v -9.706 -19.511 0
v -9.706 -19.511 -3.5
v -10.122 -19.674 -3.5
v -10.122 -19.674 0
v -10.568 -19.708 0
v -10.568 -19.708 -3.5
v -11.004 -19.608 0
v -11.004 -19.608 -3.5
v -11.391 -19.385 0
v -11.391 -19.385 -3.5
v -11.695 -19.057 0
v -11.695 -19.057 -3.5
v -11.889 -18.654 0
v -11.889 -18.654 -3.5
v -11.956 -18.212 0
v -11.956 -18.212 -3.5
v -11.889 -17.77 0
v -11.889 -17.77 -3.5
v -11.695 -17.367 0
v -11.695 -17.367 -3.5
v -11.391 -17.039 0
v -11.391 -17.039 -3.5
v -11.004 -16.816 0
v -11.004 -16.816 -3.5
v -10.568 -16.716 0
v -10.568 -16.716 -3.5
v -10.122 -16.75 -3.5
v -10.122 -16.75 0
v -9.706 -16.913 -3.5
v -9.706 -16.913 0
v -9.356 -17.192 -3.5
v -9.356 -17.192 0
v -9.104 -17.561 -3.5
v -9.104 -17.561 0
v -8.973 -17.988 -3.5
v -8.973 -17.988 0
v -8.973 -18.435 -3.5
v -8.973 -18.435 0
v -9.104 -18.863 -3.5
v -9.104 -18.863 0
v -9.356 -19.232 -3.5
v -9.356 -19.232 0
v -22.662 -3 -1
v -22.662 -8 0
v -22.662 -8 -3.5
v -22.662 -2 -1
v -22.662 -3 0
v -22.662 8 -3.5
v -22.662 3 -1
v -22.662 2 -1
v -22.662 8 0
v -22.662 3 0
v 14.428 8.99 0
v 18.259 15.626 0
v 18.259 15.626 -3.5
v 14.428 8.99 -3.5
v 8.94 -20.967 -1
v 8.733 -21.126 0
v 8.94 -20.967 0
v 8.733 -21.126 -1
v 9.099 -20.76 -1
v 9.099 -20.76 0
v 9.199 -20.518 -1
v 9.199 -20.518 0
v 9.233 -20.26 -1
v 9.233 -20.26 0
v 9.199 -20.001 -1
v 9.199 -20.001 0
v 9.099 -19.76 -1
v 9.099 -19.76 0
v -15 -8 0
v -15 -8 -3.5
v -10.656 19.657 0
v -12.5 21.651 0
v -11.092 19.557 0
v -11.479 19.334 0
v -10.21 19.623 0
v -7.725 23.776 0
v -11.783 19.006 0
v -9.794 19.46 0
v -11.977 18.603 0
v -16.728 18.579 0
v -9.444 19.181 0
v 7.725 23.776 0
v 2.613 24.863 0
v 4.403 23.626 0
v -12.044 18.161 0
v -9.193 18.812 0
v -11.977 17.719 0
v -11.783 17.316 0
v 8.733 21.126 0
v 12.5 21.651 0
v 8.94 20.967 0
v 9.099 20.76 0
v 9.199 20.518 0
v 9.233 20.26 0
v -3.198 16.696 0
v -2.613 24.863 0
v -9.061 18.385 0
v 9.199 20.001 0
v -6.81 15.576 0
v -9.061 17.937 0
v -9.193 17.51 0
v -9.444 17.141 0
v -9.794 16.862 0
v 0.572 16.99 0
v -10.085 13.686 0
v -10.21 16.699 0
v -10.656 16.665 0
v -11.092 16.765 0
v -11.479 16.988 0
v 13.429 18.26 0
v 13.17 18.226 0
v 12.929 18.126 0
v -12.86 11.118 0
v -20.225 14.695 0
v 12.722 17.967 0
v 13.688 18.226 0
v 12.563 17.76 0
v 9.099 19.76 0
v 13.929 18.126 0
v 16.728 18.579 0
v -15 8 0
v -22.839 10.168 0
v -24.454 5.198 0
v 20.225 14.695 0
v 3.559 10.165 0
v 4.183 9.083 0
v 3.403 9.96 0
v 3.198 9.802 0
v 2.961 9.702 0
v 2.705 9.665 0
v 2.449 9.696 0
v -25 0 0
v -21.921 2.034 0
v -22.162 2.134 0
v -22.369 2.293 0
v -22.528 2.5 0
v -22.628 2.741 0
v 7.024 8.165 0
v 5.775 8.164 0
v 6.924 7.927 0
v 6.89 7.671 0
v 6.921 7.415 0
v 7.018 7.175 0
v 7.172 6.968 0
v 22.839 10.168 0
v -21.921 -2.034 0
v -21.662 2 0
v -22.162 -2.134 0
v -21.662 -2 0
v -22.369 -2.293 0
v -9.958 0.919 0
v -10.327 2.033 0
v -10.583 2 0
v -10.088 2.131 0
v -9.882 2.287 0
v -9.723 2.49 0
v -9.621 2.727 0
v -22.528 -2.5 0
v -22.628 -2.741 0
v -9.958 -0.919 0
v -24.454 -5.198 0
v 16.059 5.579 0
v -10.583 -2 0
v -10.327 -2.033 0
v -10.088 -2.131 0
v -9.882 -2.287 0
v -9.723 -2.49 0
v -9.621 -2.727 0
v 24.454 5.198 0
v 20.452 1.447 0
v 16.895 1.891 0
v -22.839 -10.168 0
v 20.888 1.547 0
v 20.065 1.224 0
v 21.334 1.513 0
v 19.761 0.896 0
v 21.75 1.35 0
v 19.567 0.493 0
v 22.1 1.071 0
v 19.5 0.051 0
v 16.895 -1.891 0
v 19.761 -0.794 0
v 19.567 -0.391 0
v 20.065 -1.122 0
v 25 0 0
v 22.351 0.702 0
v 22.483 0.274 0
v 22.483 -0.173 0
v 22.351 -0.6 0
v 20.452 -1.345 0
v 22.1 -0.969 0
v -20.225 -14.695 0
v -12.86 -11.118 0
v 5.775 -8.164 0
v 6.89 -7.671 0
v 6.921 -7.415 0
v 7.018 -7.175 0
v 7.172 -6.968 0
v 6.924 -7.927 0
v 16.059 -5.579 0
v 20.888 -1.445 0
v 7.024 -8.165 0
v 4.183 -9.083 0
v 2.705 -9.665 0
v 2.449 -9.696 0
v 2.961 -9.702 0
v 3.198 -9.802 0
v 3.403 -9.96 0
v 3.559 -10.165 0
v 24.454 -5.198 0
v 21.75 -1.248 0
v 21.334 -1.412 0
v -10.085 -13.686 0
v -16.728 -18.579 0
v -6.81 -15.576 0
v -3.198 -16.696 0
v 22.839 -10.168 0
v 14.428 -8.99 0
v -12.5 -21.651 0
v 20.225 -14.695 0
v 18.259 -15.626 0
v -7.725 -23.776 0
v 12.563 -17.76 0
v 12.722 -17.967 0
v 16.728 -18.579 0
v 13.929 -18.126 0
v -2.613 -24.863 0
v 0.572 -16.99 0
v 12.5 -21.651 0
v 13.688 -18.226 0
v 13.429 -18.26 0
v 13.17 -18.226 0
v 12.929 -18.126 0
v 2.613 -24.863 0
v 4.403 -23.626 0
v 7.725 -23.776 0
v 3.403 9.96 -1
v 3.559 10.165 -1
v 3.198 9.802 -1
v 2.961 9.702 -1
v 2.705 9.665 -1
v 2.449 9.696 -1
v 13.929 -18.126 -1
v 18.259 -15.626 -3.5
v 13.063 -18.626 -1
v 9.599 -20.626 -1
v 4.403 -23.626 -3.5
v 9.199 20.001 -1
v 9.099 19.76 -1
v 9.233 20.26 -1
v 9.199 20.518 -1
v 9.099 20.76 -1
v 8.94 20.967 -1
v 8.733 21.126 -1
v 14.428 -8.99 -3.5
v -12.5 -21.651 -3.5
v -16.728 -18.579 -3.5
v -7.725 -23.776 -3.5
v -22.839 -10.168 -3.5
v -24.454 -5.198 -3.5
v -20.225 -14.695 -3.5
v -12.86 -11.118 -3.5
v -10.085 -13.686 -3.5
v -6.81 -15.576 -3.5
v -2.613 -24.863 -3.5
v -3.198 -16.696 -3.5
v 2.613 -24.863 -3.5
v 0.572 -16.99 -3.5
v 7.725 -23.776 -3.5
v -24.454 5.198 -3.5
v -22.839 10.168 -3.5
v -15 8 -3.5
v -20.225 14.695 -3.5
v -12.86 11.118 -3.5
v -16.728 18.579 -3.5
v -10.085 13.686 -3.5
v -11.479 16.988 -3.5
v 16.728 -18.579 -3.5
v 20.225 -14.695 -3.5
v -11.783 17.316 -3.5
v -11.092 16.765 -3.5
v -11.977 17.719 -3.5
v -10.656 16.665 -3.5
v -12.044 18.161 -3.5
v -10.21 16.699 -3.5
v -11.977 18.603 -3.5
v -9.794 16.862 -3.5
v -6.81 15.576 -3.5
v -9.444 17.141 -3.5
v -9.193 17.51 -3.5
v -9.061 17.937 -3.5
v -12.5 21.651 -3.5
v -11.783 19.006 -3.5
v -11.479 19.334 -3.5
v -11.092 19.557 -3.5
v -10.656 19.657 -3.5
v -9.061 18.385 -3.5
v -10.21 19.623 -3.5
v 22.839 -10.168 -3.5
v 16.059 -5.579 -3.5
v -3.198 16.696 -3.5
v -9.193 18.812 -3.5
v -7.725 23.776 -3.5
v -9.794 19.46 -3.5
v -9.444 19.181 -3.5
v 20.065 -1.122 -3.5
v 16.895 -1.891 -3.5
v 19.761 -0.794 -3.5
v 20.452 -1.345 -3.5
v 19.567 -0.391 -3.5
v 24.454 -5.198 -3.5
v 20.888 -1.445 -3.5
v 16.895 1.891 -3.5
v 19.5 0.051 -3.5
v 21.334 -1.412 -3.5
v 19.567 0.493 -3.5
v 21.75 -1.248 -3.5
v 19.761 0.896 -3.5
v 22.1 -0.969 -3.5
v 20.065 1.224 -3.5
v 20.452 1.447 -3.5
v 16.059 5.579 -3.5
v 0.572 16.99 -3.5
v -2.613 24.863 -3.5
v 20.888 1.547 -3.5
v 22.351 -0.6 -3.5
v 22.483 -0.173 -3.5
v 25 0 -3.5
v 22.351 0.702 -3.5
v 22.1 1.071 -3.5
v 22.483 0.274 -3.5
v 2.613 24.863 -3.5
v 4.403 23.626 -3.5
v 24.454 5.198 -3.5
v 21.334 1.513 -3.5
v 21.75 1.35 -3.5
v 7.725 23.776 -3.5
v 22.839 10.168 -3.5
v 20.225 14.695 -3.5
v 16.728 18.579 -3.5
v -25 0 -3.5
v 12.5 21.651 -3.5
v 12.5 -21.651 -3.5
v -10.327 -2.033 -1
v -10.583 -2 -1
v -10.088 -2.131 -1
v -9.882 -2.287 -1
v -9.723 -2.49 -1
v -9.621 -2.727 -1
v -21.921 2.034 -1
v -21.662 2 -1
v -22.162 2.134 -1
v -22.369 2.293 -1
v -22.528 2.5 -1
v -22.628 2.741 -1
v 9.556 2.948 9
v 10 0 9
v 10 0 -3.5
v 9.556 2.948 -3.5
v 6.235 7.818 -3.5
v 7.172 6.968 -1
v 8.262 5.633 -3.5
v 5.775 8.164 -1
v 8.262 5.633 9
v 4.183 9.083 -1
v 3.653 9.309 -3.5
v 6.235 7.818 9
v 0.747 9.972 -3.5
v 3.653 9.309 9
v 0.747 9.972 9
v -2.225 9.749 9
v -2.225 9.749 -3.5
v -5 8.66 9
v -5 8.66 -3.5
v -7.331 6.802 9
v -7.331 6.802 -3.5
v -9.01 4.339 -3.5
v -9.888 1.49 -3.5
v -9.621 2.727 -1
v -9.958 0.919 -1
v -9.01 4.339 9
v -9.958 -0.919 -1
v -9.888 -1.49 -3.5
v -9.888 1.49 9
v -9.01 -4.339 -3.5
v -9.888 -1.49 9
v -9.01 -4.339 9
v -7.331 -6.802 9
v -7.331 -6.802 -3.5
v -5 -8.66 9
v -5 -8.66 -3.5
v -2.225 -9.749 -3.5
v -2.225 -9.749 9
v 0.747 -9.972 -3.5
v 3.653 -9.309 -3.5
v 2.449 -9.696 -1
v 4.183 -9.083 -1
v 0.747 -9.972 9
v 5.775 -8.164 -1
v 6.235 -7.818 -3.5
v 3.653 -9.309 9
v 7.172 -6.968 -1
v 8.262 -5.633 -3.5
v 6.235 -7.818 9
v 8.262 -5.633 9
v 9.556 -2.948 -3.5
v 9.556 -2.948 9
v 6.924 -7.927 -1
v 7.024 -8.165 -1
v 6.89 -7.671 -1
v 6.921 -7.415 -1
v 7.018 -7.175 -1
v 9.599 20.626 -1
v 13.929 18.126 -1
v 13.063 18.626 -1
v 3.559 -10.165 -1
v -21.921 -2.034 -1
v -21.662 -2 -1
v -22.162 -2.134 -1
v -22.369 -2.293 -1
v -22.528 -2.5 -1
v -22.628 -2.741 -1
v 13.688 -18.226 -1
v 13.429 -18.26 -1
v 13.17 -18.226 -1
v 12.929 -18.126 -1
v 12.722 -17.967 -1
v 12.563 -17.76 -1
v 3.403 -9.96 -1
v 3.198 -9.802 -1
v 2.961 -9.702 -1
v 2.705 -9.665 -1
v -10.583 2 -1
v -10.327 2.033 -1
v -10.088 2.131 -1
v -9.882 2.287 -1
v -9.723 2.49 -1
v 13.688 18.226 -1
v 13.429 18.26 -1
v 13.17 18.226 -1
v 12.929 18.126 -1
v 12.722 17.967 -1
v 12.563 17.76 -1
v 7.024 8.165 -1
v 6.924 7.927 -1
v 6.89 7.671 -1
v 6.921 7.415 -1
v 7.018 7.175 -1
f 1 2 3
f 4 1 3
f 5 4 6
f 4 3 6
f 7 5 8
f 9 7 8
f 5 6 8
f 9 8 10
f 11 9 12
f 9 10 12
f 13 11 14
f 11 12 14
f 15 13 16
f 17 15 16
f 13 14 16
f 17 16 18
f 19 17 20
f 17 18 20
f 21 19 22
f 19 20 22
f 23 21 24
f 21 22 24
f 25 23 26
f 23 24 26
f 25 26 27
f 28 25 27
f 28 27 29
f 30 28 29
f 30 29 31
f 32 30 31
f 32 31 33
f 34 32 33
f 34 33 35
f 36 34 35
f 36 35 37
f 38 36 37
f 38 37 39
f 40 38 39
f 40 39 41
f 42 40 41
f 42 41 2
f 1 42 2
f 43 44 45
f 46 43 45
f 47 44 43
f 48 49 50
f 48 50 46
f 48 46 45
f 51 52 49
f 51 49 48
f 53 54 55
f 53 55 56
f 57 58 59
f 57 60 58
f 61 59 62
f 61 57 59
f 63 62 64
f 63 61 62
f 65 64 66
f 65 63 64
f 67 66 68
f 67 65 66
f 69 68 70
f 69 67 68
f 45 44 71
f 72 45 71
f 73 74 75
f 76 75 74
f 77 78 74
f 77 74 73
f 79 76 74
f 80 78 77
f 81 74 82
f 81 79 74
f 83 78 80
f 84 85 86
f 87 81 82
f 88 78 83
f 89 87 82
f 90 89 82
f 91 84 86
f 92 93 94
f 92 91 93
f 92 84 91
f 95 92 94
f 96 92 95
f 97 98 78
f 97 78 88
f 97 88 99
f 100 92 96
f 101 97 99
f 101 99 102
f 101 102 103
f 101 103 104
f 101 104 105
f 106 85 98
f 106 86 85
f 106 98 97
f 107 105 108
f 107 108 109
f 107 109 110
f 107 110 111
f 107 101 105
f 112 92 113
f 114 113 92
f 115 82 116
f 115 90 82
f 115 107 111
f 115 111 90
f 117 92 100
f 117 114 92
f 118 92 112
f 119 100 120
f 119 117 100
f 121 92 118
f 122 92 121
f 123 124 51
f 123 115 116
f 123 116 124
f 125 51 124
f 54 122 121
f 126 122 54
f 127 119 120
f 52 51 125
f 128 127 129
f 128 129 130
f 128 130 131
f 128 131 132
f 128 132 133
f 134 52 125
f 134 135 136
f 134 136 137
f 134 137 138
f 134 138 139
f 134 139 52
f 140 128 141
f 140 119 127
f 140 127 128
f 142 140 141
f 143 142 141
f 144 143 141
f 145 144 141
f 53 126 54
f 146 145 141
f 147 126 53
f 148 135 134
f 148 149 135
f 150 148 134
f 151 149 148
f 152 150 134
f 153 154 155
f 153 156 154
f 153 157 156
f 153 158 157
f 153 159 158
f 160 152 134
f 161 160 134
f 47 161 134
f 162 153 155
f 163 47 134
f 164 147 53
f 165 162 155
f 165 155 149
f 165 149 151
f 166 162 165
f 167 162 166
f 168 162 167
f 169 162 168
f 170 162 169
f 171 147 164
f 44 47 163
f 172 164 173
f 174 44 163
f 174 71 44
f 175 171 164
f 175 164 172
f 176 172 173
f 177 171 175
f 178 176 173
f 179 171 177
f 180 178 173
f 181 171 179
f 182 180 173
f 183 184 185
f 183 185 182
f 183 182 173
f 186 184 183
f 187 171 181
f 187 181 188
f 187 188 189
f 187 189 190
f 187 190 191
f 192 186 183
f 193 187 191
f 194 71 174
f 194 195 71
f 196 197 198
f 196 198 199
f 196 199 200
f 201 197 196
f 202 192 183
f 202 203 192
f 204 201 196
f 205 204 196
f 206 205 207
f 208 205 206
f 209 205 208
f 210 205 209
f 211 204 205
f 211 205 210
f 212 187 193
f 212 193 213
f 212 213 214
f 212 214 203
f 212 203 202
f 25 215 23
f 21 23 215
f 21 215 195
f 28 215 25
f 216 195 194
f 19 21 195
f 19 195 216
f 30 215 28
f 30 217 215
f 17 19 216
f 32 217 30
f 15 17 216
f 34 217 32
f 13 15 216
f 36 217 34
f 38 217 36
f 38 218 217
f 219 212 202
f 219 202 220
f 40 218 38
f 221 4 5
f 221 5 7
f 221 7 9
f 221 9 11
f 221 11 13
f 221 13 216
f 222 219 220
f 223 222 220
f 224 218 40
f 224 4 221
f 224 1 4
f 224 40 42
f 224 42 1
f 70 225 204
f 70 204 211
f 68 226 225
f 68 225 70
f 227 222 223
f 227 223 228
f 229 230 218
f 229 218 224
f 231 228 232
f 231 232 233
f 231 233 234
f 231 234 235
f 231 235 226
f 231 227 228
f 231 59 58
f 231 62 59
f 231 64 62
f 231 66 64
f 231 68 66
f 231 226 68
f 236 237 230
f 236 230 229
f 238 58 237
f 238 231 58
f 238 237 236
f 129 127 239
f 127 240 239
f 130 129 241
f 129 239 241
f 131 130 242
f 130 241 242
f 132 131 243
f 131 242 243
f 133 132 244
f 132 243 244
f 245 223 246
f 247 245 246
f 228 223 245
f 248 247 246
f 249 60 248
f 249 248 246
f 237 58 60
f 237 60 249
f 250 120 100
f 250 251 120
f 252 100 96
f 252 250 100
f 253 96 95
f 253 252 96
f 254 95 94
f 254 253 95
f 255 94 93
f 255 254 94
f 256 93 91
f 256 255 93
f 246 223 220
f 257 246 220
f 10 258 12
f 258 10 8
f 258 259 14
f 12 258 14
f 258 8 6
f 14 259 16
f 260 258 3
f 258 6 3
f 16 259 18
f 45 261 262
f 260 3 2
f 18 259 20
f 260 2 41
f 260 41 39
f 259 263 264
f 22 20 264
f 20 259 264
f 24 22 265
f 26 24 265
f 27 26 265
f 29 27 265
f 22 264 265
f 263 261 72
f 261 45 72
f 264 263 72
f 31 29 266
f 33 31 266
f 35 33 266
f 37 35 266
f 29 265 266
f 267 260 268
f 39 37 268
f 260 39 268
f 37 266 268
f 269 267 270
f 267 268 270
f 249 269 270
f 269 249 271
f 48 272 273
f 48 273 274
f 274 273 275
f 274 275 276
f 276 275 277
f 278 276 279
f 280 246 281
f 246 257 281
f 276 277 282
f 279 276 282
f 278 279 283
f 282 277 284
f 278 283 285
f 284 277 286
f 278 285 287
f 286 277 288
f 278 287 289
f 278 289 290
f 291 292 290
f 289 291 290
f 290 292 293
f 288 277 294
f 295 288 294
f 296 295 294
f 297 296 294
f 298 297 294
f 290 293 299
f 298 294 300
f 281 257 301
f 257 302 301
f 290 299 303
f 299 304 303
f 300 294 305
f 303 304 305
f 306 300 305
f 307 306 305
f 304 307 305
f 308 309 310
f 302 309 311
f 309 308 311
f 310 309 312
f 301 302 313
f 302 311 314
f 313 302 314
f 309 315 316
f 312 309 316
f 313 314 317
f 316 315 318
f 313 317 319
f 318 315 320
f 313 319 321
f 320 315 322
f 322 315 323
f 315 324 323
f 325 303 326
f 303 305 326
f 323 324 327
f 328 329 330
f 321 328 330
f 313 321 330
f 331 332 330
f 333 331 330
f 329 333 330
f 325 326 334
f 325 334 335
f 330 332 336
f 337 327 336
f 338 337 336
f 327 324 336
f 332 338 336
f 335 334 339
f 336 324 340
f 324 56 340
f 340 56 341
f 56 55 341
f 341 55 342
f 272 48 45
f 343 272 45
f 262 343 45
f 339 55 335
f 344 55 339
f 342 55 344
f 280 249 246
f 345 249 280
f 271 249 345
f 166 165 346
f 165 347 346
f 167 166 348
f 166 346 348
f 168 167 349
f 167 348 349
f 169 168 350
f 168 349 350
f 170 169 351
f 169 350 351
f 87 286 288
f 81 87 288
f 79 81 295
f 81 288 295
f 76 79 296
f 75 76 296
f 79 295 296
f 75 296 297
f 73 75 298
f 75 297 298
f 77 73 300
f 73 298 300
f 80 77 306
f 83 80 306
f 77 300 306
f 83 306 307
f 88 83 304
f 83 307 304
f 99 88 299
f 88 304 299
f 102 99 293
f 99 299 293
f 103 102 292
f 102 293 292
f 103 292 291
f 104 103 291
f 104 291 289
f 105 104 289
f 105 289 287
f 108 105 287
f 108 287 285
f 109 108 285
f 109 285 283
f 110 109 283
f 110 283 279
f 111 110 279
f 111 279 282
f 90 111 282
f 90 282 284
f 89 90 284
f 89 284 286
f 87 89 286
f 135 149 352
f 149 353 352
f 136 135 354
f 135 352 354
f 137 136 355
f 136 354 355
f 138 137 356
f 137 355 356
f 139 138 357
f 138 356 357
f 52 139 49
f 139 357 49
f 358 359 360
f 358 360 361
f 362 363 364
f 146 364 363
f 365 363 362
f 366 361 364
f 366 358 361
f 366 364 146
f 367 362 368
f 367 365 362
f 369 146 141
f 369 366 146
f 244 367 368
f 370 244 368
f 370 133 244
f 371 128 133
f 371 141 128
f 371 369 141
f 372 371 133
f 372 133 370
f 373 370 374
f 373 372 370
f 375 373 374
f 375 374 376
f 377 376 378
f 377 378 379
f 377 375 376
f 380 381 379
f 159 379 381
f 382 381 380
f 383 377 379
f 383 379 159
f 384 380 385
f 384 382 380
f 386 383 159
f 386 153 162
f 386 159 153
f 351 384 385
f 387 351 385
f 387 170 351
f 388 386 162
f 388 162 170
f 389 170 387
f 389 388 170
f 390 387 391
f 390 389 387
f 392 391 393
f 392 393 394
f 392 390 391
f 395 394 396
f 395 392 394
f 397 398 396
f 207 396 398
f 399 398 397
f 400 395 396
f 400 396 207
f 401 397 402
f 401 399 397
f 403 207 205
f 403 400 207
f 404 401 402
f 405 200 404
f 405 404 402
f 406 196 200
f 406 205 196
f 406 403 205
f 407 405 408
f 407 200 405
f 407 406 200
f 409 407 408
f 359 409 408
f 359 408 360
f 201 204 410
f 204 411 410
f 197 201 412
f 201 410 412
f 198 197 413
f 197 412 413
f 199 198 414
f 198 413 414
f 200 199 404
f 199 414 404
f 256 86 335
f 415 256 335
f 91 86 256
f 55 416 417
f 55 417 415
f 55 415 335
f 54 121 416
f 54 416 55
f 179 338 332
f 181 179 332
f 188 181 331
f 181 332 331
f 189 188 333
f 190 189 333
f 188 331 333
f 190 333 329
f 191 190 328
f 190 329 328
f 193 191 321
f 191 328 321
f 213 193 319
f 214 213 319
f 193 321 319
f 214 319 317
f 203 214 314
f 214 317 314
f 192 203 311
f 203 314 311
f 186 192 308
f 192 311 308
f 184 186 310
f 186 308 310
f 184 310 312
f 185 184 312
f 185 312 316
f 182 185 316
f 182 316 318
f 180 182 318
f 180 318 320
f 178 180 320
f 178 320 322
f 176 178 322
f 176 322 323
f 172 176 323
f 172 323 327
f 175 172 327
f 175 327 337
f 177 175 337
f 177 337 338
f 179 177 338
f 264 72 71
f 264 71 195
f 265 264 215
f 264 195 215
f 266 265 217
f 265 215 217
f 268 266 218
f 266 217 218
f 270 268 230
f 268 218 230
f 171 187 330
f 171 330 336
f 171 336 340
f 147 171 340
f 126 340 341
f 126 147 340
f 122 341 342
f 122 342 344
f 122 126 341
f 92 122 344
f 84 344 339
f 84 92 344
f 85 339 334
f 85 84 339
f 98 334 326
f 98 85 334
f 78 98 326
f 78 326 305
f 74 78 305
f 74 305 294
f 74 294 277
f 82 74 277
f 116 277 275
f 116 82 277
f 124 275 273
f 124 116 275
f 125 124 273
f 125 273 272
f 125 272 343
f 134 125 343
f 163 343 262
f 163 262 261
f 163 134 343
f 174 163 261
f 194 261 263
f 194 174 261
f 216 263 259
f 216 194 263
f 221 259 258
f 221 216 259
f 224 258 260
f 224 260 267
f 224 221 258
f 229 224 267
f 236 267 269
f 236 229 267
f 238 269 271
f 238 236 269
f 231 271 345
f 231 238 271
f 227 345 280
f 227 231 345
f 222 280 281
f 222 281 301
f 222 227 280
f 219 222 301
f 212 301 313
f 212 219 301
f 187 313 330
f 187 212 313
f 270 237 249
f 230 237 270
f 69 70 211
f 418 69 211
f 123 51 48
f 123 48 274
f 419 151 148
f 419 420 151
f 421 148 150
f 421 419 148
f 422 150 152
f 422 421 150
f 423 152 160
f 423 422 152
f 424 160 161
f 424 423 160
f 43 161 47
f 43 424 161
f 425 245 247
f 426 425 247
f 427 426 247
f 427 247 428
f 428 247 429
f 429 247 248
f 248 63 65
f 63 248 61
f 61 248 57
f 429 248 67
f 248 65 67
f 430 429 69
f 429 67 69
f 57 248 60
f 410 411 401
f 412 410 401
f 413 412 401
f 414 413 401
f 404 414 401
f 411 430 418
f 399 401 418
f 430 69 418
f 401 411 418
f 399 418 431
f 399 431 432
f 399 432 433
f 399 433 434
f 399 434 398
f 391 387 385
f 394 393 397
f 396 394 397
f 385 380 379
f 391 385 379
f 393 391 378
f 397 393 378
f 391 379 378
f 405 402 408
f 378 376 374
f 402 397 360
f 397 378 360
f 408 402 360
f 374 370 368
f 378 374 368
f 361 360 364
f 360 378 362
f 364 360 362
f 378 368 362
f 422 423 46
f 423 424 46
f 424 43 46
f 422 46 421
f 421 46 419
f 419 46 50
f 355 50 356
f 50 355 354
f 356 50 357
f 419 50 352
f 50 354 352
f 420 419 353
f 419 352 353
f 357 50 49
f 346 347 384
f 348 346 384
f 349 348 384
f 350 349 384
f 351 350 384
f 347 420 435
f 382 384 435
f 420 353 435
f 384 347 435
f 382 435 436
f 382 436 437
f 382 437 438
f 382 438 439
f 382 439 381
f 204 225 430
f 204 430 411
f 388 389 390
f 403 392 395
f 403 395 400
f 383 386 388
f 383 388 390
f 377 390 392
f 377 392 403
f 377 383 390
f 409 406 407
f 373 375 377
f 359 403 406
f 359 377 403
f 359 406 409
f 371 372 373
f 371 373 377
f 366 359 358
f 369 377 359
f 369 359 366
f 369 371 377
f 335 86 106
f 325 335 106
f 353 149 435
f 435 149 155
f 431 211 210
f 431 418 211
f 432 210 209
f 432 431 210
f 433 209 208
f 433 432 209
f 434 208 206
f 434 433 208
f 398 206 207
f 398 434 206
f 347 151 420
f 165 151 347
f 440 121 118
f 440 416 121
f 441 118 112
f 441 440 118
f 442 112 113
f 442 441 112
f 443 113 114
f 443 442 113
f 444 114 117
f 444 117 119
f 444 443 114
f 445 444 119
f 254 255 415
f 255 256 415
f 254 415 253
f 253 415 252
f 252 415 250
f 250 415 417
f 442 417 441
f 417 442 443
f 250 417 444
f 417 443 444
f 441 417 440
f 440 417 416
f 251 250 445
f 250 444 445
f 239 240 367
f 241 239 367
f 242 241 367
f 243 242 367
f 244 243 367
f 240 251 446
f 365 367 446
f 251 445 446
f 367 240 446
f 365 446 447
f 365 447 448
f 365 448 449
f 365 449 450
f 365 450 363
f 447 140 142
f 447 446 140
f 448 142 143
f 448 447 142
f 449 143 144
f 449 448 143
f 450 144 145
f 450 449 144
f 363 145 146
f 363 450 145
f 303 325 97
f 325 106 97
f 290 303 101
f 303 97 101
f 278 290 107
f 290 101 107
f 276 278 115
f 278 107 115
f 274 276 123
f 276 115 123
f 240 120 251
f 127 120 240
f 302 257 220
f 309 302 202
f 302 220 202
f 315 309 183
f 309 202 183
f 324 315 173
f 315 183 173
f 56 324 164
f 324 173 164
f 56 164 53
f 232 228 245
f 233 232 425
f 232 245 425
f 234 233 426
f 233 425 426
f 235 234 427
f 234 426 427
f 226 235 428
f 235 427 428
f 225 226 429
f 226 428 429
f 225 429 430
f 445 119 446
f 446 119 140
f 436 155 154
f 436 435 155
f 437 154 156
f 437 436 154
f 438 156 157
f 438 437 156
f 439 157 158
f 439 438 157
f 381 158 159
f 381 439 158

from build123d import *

# Parameters (mm, degrees)
SKETCH1_R                = 10
BOSS_EXTRUDE1_DEPTH      = 9
BOSS_EXTRUDE1_DEPTH_BACK = 3.5
SKETCH1_3_R              = 25
SKETCH1_3_R_2            = 10
BOSS_EXTRUDE2_DEPTH      = 3.5
SKETCH3_R                = 17
CUT_EXTRUDE1_DEPTH       = 3.5
SKETCH8_W                = 9
SKETCH8_H                = 16
CUT_EXTRUDE3_DEPTH       = 4.5
SKETCH10_W               = 12.863801869
SKETCH10_H               = 4
BOSS_EXTRUDE4_DEPTH      = 1
CIRPATTERN2_COUNT        = 3
F_3_0MM_DOWEL_HOLE1_D    = 3
CIRPATTERN3_COUNT        = 3
FILLET1_R                = 1
FILLET2_R                = 1
FILLET3_R                = 1
FILLET4_R                = 1
FILLET5_R                = 1
FILLET6_R                = 1
FILLET7_R                = 1
FILLET8_R                = 1
FILLET9_R                = 1
FILLET10_R               = 1
FILLET11_R               = 1
FILLET12_R               = 1


with BuildPart() as part:
    # Sketch1 → Boss-Extrude1 (new body, two sides)
    with BuildSketch(Plane.XY) as boss_extrude1_sk:
        Circle(SKETCH1_R)
    extrude(amount=BOSS_EXTRUDE1_DEPTH)
    extrude(boss_extrude1_sk.sketch, amount=-BOSS_EXTRUDE1_DEPTH_BACK)



with BuildPart() as body_2:
    # Sketch1<3> → Boss-Extrude2 (new body)
    with BuildSketch(Plane.XY):
        Circle(SKETCH1_3_R)
        Circle(SKETCH1_3_R_2, mode=Mode.SUBTRACT)
    extrude(amount=-BOSS_EXTRUDE2_DEPTH)

    # Sketch3 → Cut-Extrude1 (cut)
    with BuildSketch(Plane.XY):
        Circle(SKETCH3_R)
    extrude(amount=-CUT_EXTRUDE1_DEPTH, mode=Mode.SUBTRACT)

    # Sketch8 → Cut-Extrude3 (cut, through all)
    with BuildSketch(Plane.XY):
        with Locations((-18.16176084, 0)):
            Rectangle(SKETCH8_W, SKETCH8_H)
    cut_extrude3 = extrude(amount=-CUT_EXTRUDE3_DEPTH, mode=Mode.SUBTRACT)


with BuildPart() as part_1:
    add(part.part)

    add(body_2.part)  # Boss-Extrude4 merges body 2
    # Sketch10 → Boss-Extrude4 (add)
    with BuildSketch(Plane.XY):
        with Locations((-16.229859905, 0)):
            Rectangle(SKETCH10_W, SKETCH10_H)
    boss_extrude4 = extrude(amount=-BOSS_EXTRUDE4_DEPTH)

    # CirPattern2: Cut-Extrude3, Boss-Extrude4 ×3 about axis
    cirpattern2_axis = Axis((0, 0, 0), (0, 0, 1))
    for i in range(1, CIRPATTERN2_COUNT):
        add(cut_extrude3.rotate(cirpattern2_axis, i * 360 / CIRPATTERN2_COUNT), mode=Mode.SUBTRACT)
        add(boss_extrude4.rotate(cirpattern2_axis, i * 360 / CIRPATTERN2_COUNT))

    # Ø3.0mm Dowel Hole1 (through all)
    with Locations(Plane.XY):
        with Locations((-10.544029887, 18.161041648)):
            f_3_0mm_dowel_hole1 = Hole(F_3_0MM_DOWEL_HOLE1_D / 2)

    # CirPattern3: Ø3.0mm Dowel Hole1 ×3 about axis
    cirpattern3_axis = Axis((0, 0, 0), (0, 0, 1))
    for i in range(1, CIRPATTERN3_COUNT):
        add(f_3_0mm_dowel_hole1.rotate(cirpattern3_axis, i * 360 / CIRPATTERN3_COUNT), mode=Mode.SUBTRACT)

    # Fillet1
    fillet1_edges = [part_1.edges().sort_by_distance(p)[0] for p in [
        (9.598829613, 20.625660582, -0.5),
    ]]
    fillet(fillet1_edges, radius=FILLET1_R)

    # Fillet2
    fillet2_edges = [part_1.edges().sort_by_distance(p)[0] for p in [
        (13.062931228, 18.625660582, -0.5),
    ]]
    fillet(fillet2_edges, radius=FILLET2_R)

    # Fillet3
    fillet3_edges = [part_1.edges().sort_by_distance(p)[0] for p in [
        (6.631030293, 7.485281374, -0.5),
    ]]
    fillet(fillet3_edges, radius=FILLET3_R)

    # Fillet4
    fillet4_edges = [part_1.edges().sort_by_distance(p)[0] for p in [
        (3.166928678, 9.485281374, -0.5),
    ]]
    fillet(fillet4_edges, radius=FILLET4_R)

    # Fillet5
    fillet5_edges = [part_1.edges().sort_by_distance(p)[0] for p in [
        (-22.66176084, 2, -0.5),
    ]]
    fillet(fillet5_edges, radius=FILLET5_R)

    # Fillet6
    fillet6_edges = [part_1.edges().sort_by_distance(p)[0] for p in [
        (-9.797958971, 2, -0.5),
    ]]
    fillet(fillet6_edges, radius=FILLET6_R)

    # Fillet7
    fillet7_edges = [part_1.edges().sort_by_distance(p)[0] for p in [
        (-22.66176084, -2, -0.5),
    ]]
    fillet(fillet7_edges, radius=FILLET7_R)

    # Fillet8
    fillet8_edges = [part_1.edges().sort_by_distance(p)[0] for p in [
        (-9.797958971, -2, -0.5),
    ]]
    fillet(fillet8_edges, radius=FILLET8_R)

    # Fillet9
    fillet9_edges = [part_1.edges().sort_by_distance(p)[0] for p in [
        (3.166928678, -9.485281374, -0.5),
    ]]
    fillet(fillet9_edges, radius=FILLET9_R)

    # Fillet10
    fillet10_edges = [part_1.edges().sort_by_distance(p)[0] for p in [
        (6.631030293, -7.485281374, -0.5),
    ]]
    fillet(fillet10_edges, radius=FILLET10_R)

    # Fillet11
    fillet11_edges = [part_1.edges().sort_by_distance(p)[0] for p in [
        (9.598829613, -20.625660582, -0.5),
    ]]
    fillet(fillet11_edges, radius=FILLET11_R)

    # Fillet12
    fillet12_edges = [part_1.edges().sort_by_distance(p)[0] for p in [
        (13.062931228, -18.625660582, -0.5),
    ]]
    fillet(fillet12_edges, radius=FILLET12_R)


solid = part_1.part
